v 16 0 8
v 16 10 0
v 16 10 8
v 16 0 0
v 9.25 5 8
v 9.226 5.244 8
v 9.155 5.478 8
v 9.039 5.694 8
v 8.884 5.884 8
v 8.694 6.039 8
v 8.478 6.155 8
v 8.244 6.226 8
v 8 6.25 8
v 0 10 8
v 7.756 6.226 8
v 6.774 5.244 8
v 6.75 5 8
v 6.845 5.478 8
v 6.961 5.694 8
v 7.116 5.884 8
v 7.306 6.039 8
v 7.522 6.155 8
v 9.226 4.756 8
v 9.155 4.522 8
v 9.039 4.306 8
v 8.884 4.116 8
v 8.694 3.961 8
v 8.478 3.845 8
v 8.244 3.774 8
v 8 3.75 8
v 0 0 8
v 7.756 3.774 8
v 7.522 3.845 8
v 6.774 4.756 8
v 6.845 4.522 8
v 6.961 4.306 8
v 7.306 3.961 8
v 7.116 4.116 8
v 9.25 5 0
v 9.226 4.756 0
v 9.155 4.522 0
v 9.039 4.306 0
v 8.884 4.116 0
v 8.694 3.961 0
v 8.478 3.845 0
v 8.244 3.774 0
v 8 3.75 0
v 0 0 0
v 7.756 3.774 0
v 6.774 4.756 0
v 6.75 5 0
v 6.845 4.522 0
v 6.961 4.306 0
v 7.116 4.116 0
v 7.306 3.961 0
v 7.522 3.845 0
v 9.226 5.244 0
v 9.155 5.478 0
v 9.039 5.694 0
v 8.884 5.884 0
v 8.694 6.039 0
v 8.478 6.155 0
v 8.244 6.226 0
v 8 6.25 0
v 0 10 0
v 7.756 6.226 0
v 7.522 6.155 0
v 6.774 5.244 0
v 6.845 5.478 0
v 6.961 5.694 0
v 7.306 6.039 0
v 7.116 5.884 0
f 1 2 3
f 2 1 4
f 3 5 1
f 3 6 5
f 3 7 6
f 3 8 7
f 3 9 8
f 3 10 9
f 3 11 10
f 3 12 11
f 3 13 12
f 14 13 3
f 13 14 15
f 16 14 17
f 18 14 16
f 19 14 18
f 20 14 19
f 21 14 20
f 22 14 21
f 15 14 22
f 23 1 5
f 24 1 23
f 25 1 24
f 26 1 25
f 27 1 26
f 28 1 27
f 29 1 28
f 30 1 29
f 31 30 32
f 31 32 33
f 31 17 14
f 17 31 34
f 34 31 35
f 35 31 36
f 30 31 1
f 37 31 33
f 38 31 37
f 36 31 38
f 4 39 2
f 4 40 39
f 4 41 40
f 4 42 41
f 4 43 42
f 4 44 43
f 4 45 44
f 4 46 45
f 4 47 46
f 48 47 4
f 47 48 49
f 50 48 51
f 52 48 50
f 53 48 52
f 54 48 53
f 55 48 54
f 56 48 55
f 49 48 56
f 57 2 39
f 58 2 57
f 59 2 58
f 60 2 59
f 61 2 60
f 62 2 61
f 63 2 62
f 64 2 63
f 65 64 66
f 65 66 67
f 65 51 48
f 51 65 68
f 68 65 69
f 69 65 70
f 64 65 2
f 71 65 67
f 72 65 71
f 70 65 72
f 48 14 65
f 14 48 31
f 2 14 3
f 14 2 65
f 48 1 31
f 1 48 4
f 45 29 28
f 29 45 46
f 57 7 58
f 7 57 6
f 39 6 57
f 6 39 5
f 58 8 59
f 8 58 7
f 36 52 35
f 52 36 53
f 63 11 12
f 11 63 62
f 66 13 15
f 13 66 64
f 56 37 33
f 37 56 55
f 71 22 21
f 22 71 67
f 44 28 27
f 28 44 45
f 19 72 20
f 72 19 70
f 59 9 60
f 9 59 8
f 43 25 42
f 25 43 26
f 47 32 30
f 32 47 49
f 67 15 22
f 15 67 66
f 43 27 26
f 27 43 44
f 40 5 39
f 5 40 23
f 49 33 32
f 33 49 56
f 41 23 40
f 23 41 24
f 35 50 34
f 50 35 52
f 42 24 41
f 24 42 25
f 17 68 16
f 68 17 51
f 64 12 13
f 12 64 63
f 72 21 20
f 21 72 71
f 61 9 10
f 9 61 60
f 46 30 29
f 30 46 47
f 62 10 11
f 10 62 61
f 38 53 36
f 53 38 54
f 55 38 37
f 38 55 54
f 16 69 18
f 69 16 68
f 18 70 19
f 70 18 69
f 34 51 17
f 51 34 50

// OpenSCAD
$fn = 32;

// ----------------------------------------------------------------------
// Micro pad: drilled pad, 5-20 mm class
// ----------------------------------------------------------------------

// --- parameters (mm) ---
pad_l = 16;               // pad length, X
pad_w = 10;               // pad width, Y
pad_t = 8;                // pad thickness, Z
hole_d = 2.5;             // through hole diameter

difference() {
  cube([pad_l, pad_w, pad_t]);
  translate([pad_l / 2, pad_w / 2, -1])
    cylinder(h = pad_t + 2, d = hole_d);
}
